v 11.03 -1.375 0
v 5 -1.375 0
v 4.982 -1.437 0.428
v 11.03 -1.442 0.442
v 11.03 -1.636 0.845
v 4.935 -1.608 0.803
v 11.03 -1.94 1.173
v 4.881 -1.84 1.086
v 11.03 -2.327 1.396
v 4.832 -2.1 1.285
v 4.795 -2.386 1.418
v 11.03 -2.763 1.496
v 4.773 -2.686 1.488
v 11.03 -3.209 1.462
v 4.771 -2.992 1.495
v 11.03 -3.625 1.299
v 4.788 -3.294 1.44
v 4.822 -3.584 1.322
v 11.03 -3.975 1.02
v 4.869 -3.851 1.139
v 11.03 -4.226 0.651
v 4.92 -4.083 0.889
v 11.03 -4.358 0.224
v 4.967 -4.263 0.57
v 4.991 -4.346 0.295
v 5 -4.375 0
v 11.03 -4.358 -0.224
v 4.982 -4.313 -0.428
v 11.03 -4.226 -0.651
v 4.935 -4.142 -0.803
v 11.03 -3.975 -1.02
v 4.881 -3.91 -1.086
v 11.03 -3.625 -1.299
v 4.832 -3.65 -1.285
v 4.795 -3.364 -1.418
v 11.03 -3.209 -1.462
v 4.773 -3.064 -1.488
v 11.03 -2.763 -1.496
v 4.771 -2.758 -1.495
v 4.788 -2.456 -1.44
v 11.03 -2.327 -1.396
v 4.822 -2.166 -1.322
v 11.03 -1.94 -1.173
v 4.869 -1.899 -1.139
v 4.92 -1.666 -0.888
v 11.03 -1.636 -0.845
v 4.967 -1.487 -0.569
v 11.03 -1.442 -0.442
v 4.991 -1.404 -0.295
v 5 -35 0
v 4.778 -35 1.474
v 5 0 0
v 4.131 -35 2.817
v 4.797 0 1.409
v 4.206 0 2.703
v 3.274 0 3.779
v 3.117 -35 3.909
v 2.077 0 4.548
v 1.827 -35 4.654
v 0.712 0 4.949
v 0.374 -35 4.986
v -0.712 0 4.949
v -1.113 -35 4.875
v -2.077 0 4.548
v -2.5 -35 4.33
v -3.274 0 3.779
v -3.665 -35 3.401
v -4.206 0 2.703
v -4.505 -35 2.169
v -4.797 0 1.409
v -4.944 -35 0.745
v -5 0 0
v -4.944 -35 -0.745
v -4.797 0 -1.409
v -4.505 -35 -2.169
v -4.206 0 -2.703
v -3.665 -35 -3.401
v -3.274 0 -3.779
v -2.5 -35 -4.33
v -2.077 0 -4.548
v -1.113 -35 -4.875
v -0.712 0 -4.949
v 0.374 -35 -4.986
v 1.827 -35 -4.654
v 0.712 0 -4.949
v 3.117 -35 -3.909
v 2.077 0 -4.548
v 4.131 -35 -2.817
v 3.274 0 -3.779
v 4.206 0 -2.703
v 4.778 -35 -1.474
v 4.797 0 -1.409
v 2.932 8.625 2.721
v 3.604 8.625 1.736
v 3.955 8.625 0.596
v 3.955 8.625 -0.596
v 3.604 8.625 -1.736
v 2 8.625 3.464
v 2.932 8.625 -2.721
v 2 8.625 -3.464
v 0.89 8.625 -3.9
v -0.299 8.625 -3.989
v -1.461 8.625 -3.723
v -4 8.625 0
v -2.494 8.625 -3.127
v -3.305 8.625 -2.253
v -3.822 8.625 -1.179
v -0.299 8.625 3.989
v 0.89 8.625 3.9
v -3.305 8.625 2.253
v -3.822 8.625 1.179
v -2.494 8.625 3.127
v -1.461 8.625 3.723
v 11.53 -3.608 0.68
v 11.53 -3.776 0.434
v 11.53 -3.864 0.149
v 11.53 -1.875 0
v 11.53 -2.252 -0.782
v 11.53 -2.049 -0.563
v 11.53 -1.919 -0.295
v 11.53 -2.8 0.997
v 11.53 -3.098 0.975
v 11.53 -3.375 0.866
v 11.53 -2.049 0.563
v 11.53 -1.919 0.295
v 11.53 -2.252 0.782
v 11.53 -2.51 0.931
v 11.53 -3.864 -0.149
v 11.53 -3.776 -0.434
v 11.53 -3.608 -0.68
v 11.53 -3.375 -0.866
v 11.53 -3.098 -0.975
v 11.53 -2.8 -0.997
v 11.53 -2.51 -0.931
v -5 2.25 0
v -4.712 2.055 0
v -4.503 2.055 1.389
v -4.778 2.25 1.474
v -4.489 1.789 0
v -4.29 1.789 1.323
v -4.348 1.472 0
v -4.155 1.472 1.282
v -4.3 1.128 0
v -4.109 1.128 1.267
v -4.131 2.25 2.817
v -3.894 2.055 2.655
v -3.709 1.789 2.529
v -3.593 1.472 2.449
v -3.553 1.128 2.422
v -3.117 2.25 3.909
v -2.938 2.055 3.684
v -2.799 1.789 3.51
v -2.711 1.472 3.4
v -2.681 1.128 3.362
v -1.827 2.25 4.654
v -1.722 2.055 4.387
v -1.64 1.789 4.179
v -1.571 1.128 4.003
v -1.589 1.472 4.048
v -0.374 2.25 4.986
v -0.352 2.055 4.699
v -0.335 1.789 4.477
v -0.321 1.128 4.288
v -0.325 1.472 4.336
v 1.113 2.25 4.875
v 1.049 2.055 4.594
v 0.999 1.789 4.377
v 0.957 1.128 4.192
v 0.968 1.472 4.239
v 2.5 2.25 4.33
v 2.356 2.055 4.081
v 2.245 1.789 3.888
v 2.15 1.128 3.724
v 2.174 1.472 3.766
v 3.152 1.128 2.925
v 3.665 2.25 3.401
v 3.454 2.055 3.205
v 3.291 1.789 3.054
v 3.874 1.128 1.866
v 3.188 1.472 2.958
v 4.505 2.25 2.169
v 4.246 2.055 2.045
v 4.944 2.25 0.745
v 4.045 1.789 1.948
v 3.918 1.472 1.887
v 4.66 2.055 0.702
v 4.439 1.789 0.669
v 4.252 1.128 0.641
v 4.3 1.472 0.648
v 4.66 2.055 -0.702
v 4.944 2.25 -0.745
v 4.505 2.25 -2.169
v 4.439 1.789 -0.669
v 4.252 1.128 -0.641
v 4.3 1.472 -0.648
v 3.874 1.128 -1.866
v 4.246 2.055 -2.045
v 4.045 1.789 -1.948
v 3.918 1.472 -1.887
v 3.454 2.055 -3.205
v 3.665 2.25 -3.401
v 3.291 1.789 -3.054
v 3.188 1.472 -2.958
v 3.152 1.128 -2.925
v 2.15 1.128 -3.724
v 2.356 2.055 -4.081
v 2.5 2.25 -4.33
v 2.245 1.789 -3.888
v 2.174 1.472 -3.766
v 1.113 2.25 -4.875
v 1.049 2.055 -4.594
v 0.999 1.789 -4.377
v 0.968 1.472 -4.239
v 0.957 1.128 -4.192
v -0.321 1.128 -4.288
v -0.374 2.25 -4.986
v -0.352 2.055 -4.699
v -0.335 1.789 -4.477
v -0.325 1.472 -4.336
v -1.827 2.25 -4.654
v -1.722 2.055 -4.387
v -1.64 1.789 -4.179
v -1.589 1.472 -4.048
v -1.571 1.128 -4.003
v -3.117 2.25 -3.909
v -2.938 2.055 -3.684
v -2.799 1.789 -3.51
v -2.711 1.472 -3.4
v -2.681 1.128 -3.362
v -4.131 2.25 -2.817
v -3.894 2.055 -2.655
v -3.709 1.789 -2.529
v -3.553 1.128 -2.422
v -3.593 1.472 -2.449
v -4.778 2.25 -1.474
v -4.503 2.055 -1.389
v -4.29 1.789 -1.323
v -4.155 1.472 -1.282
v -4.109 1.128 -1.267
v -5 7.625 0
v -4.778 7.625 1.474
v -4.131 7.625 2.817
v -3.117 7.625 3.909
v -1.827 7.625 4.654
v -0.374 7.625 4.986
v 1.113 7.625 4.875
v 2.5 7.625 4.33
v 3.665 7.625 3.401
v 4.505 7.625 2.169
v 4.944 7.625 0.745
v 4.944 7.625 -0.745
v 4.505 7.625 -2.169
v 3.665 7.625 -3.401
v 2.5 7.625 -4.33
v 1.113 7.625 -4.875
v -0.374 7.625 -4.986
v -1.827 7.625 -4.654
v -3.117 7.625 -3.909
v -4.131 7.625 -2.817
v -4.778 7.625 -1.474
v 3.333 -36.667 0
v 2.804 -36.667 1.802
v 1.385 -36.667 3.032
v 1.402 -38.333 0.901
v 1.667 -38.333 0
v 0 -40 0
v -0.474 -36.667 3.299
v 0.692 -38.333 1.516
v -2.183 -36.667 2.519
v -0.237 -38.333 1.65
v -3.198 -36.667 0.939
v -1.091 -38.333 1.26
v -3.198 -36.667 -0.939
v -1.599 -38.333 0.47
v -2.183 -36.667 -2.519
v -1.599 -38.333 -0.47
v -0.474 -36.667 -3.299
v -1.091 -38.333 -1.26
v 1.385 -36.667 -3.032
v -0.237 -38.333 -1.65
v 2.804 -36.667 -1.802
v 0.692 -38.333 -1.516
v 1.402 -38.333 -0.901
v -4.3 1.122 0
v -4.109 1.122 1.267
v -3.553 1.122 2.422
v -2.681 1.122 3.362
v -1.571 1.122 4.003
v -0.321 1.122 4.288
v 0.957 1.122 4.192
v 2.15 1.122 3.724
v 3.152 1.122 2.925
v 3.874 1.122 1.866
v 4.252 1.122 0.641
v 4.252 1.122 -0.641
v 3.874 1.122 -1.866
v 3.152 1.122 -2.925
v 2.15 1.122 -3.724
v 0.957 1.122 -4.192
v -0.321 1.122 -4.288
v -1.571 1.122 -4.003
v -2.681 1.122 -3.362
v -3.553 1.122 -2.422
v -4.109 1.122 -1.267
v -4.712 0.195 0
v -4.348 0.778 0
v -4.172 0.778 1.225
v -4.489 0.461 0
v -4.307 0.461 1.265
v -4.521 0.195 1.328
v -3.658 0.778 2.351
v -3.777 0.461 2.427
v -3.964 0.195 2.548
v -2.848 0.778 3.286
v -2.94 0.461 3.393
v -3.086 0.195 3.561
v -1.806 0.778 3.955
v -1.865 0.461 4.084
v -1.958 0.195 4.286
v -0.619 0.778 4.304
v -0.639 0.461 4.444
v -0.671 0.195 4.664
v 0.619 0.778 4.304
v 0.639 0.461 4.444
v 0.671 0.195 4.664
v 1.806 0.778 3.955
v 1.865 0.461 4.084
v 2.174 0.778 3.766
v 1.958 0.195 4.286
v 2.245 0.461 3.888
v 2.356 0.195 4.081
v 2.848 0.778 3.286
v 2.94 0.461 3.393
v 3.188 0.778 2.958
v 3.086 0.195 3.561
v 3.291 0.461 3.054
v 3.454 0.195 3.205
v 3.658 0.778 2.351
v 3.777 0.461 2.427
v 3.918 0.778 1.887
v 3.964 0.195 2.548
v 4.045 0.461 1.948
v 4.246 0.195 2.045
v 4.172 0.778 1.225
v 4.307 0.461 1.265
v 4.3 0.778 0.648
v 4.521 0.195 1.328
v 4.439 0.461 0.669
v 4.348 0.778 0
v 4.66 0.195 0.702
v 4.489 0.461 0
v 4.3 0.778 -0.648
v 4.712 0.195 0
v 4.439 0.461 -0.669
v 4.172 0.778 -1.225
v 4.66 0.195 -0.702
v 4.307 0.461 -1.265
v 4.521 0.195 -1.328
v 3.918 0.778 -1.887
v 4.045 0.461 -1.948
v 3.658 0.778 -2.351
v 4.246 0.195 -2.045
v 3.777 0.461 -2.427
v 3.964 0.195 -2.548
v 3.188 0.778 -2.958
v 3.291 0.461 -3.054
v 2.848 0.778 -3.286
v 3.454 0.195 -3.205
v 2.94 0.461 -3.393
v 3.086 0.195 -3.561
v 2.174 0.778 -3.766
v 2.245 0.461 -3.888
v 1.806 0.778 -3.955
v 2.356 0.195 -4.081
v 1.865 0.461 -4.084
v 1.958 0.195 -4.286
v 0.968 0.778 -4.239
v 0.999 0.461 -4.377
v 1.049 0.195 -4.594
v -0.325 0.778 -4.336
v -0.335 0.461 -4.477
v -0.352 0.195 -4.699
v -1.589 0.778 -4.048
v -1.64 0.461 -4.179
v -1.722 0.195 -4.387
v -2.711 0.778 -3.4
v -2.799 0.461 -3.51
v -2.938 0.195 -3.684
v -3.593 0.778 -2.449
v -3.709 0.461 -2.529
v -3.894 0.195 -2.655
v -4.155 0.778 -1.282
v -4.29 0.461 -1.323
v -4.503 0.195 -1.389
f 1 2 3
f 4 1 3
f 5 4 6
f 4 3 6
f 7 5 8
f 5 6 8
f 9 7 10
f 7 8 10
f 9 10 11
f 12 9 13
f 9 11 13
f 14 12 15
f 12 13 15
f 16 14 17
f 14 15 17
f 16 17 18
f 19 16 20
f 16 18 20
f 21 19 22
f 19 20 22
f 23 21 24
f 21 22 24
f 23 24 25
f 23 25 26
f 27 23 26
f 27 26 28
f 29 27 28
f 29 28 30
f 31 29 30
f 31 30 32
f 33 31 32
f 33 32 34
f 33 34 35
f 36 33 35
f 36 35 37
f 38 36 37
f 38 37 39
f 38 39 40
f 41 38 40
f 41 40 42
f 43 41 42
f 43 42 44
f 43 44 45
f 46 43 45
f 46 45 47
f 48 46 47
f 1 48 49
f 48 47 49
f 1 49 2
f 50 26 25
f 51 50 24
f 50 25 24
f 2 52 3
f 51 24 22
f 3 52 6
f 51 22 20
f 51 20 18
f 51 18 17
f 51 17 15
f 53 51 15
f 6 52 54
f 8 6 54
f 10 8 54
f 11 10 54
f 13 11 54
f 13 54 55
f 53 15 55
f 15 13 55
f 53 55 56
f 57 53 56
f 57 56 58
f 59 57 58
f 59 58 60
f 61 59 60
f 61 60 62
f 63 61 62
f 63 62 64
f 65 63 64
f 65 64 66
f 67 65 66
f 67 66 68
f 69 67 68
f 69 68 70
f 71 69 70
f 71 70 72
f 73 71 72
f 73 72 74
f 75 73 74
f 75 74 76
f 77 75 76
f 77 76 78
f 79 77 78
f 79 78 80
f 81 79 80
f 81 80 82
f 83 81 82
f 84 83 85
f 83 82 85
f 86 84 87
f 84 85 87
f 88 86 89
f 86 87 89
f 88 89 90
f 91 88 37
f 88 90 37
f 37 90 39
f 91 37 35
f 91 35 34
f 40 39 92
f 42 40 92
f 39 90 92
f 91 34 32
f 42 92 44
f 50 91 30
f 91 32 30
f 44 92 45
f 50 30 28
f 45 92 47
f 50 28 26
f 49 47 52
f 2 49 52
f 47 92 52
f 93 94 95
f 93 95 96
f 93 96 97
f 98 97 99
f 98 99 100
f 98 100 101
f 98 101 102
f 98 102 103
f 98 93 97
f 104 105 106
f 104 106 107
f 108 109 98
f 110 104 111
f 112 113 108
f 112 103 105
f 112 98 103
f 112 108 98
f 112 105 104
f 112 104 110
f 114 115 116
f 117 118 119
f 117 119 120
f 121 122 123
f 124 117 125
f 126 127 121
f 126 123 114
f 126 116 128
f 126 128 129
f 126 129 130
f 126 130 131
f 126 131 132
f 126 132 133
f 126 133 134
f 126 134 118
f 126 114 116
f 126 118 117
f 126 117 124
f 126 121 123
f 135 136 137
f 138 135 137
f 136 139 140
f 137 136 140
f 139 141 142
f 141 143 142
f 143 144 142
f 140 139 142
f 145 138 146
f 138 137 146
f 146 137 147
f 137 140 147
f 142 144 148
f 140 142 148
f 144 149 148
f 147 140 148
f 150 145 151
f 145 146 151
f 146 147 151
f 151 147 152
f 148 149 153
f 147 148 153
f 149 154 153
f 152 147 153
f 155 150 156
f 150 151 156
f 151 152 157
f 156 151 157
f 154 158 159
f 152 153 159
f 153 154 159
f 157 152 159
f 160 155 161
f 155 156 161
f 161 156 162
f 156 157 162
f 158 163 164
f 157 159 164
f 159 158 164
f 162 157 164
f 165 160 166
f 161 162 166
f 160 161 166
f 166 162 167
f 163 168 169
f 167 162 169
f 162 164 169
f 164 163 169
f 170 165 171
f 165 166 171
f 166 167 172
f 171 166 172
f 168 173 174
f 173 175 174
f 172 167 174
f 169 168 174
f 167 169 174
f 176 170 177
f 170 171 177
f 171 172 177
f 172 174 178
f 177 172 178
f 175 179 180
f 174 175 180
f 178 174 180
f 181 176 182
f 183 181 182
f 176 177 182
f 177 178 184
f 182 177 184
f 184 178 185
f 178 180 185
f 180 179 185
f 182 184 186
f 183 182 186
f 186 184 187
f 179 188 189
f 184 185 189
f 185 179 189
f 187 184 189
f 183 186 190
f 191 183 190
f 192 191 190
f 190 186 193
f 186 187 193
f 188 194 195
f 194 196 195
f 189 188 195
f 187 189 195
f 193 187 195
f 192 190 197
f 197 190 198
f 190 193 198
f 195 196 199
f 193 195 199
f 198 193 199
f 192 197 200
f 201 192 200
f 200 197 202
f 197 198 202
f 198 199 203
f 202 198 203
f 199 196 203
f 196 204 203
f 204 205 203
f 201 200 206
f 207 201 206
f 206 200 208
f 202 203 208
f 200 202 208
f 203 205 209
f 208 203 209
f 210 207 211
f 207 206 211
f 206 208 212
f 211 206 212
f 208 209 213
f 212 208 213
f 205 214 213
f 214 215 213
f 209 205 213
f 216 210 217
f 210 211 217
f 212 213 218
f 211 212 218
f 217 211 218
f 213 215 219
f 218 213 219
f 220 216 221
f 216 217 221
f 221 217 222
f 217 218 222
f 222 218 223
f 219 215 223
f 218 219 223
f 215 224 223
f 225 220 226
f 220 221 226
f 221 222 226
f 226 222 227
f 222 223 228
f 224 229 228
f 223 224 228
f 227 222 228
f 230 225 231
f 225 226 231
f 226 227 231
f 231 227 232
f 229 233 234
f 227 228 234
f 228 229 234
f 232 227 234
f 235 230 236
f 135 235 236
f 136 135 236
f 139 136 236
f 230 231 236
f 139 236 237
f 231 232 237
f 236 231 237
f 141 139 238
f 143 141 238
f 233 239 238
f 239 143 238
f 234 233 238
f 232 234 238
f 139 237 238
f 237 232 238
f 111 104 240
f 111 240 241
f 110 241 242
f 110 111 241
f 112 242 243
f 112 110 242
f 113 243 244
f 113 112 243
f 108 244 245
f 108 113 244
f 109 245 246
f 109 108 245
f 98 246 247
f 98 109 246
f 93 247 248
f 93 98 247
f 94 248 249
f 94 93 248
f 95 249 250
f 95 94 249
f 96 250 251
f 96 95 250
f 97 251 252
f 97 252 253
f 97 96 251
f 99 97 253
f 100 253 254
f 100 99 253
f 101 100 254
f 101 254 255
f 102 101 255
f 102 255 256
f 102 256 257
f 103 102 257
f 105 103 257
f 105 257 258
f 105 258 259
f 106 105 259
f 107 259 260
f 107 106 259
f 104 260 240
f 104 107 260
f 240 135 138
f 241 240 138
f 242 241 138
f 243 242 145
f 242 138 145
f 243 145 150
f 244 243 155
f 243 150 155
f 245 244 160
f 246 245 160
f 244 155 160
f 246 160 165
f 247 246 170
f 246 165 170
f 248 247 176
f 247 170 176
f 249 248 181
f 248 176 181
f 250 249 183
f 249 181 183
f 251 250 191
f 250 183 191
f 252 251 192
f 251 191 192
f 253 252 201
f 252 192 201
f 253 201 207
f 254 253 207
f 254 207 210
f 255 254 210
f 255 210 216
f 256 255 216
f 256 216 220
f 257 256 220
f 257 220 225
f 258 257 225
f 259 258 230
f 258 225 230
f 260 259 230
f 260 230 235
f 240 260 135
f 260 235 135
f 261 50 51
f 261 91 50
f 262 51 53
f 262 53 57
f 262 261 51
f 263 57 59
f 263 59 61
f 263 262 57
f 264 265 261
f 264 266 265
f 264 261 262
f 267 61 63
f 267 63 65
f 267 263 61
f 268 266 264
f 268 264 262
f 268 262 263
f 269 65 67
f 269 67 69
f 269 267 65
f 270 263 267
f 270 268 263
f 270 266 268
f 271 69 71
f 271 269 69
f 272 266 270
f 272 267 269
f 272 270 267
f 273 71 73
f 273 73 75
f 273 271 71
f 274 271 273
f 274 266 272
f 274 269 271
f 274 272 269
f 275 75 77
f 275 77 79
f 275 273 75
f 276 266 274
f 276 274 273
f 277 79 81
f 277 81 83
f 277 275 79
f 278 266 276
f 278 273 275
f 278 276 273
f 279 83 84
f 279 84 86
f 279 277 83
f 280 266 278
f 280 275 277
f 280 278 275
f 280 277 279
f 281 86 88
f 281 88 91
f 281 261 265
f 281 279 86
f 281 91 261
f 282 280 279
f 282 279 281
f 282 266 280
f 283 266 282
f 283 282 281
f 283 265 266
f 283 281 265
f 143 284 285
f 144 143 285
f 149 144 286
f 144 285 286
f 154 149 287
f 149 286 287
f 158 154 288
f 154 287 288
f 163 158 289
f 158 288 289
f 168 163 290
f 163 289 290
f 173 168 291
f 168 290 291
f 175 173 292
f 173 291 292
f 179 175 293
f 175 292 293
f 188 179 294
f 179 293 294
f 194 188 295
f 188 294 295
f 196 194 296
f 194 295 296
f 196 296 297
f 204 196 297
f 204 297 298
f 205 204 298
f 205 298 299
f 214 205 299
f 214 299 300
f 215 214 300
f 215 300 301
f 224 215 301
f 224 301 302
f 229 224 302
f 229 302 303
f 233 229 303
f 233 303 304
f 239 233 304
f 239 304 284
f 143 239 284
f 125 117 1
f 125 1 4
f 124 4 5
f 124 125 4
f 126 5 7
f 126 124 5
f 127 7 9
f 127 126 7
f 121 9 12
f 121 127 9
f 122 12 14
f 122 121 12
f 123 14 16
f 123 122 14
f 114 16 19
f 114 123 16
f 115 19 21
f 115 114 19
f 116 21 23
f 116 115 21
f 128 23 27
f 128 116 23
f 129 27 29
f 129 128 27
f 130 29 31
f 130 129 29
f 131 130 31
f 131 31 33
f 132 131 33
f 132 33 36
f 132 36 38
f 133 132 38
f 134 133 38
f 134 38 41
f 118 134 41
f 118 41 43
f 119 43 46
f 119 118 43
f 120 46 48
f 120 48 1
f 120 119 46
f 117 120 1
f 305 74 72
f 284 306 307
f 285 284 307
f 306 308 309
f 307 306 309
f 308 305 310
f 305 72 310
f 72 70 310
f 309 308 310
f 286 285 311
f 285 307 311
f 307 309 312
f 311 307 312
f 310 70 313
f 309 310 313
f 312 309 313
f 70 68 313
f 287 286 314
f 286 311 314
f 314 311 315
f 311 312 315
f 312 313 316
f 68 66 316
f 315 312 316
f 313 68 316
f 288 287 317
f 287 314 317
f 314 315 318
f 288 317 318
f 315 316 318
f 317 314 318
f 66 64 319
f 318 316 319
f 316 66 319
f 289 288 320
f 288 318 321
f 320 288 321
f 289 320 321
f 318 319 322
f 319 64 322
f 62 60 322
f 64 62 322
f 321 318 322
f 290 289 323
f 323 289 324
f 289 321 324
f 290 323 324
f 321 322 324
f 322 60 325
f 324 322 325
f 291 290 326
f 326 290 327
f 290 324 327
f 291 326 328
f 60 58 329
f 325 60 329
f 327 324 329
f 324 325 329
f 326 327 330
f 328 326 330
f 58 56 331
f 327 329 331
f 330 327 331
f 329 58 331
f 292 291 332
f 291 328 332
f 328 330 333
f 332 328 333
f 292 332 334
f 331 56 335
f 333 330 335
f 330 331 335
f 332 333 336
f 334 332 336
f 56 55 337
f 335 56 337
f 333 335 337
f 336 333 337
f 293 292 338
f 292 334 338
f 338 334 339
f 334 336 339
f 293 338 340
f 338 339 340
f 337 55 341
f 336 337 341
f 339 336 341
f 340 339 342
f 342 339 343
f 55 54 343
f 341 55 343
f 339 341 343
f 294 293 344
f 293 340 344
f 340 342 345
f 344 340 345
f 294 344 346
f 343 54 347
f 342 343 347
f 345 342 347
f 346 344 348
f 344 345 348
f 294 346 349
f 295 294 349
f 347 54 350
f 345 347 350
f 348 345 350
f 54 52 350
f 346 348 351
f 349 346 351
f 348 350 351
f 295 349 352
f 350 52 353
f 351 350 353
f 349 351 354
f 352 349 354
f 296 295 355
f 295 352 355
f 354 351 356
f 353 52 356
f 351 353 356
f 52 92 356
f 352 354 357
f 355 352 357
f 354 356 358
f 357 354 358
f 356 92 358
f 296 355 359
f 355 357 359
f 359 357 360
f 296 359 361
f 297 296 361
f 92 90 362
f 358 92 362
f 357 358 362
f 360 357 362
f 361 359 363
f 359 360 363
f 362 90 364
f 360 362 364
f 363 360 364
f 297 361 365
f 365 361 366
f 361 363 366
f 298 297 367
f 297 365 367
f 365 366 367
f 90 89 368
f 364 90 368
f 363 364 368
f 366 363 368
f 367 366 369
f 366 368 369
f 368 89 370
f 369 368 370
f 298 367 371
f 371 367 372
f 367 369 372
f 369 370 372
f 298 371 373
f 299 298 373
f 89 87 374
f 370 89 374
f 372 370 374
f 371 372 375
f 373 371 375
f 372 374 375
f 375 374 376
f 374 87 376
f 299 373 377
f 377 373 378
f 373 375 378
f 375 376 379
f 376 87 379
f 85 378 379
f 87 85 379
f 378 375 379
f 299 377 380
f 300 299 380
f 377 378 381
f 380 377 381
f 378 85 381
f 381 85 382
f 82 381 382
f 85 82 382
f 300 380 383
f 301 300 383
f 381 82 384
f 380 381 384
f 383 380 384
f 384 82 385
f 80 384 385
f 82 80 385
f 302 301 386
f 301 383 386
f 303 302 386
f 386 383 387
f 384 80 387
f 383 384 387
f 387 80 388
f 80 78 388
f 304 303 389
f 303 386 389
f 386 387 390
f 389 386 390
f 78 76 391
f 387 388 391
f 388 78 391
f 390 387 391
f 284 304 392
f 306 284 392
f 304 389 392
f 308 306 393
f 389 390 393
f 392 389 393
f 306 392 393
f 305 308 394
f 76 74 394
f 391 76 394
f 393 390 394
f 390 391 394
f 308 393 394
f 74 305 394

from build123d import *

# Parameters (mm, degrees)
F0_R     = 5
F1_DEPTH = 40
F2_R     = 4.3
F3_DEPTH = 2.25
F4_R     = 5
F5_DEPTH = 6.375
F7_SIZE  = 1
F8_R     = 1.5
F9_DEPTH = 11.53
F10_SIZE = 0.5
F11_SIZE = 5


# Not quite as in the source:
# - a fillet or chamfer that OpenCascade refuses, or shapes differently, is made with other operations: its cross-section is extruded or revolved along the edge and cut away or added


with BuildPart() as f1:
    # F0 (on Front) → F1 (new body)
    with BuildSketch(Plane.XZ):
        Circle(F0_R)
    extrude(amount=F1_DEPTH)

    # F2 (on face) → F3 (join)
    with BuildSketch(Plane(origin=(0, 0, 0), x_dir=(-1, 0, 0), z_dir=(0, 1, 0))):
        Circle(F2_R)
    extrude(amount=F3_DEPTH)

    # F4 (on face) → F5 (join)
    with BuildSketch(Plane(origin=(0, 2.25, 0), x_dir=(-1, 0, 0), z_dir=(0, 1, 0))):
        Circle(F4_R)
    extrude(amount=F5_DEPTH)

    # F6: fillet of radius 1.25 on 3 edges, made by hand

    # F6_s1 → F6_t2 (revolve)
    with BuildSketch(Plane.XY):
        with BuildLine():
            ThreePointArc((-4.3, 1.122497216), (-4.4893398282, 0.4610593883), (-5, 0))
            Line((-5, 0), (-4.3, 0))
            Line((-4.3, 0), (-4.3, 1.122497216))
        make_face()
    revolve(axis=Axis((0, 0, 0), (0, 1, 0)))

    # F6_s3 → F6_t4 (revolve)
    with BuildSketch(Plane.XY):
        with BuildLine():
            ThreePointArc((-5, 2.25), (-4.4893398282, 1.7889406117), (-4.3, 1.127502784))
            Line((-4.3, 1.127502784), (-4.3, 2.25))
            Line((-4.3, 2.25), (-5, 2.25))
        make_face()
    revolve(axis=Axis((0, 2.25, 0), (0, 1, 0)))

    # F7
    f7_edges = [f1.edges().sort_by_distance(p)[0] for p in [
        (5, 8.625, 0),
    ]]
    chamfer(f7_edges, length=F7_SIZE)

    # F8 (on Right) → F9 (join)
    with BuildSketch(Plane.YZ):
        with Locations((-2.875, 0)):
            Circle(F8_R)
    extrude(amount=F9_DEPTH)

    # F10
    f10_edges = [f1.edges().sort_by_distance(p)[0] for p in [
        (11.53, -4.375, 0),
    ]]
    chamfer(f10_edges, length=F10_SIZE)

    # F11
    f11_edges = [f1.edges().sort_by_distance(p)[0] for p in [
        (-5, -40, 0),
    ]]
    chamfer(f11_edges, length=F11_SIZE)


solid = f1.part
